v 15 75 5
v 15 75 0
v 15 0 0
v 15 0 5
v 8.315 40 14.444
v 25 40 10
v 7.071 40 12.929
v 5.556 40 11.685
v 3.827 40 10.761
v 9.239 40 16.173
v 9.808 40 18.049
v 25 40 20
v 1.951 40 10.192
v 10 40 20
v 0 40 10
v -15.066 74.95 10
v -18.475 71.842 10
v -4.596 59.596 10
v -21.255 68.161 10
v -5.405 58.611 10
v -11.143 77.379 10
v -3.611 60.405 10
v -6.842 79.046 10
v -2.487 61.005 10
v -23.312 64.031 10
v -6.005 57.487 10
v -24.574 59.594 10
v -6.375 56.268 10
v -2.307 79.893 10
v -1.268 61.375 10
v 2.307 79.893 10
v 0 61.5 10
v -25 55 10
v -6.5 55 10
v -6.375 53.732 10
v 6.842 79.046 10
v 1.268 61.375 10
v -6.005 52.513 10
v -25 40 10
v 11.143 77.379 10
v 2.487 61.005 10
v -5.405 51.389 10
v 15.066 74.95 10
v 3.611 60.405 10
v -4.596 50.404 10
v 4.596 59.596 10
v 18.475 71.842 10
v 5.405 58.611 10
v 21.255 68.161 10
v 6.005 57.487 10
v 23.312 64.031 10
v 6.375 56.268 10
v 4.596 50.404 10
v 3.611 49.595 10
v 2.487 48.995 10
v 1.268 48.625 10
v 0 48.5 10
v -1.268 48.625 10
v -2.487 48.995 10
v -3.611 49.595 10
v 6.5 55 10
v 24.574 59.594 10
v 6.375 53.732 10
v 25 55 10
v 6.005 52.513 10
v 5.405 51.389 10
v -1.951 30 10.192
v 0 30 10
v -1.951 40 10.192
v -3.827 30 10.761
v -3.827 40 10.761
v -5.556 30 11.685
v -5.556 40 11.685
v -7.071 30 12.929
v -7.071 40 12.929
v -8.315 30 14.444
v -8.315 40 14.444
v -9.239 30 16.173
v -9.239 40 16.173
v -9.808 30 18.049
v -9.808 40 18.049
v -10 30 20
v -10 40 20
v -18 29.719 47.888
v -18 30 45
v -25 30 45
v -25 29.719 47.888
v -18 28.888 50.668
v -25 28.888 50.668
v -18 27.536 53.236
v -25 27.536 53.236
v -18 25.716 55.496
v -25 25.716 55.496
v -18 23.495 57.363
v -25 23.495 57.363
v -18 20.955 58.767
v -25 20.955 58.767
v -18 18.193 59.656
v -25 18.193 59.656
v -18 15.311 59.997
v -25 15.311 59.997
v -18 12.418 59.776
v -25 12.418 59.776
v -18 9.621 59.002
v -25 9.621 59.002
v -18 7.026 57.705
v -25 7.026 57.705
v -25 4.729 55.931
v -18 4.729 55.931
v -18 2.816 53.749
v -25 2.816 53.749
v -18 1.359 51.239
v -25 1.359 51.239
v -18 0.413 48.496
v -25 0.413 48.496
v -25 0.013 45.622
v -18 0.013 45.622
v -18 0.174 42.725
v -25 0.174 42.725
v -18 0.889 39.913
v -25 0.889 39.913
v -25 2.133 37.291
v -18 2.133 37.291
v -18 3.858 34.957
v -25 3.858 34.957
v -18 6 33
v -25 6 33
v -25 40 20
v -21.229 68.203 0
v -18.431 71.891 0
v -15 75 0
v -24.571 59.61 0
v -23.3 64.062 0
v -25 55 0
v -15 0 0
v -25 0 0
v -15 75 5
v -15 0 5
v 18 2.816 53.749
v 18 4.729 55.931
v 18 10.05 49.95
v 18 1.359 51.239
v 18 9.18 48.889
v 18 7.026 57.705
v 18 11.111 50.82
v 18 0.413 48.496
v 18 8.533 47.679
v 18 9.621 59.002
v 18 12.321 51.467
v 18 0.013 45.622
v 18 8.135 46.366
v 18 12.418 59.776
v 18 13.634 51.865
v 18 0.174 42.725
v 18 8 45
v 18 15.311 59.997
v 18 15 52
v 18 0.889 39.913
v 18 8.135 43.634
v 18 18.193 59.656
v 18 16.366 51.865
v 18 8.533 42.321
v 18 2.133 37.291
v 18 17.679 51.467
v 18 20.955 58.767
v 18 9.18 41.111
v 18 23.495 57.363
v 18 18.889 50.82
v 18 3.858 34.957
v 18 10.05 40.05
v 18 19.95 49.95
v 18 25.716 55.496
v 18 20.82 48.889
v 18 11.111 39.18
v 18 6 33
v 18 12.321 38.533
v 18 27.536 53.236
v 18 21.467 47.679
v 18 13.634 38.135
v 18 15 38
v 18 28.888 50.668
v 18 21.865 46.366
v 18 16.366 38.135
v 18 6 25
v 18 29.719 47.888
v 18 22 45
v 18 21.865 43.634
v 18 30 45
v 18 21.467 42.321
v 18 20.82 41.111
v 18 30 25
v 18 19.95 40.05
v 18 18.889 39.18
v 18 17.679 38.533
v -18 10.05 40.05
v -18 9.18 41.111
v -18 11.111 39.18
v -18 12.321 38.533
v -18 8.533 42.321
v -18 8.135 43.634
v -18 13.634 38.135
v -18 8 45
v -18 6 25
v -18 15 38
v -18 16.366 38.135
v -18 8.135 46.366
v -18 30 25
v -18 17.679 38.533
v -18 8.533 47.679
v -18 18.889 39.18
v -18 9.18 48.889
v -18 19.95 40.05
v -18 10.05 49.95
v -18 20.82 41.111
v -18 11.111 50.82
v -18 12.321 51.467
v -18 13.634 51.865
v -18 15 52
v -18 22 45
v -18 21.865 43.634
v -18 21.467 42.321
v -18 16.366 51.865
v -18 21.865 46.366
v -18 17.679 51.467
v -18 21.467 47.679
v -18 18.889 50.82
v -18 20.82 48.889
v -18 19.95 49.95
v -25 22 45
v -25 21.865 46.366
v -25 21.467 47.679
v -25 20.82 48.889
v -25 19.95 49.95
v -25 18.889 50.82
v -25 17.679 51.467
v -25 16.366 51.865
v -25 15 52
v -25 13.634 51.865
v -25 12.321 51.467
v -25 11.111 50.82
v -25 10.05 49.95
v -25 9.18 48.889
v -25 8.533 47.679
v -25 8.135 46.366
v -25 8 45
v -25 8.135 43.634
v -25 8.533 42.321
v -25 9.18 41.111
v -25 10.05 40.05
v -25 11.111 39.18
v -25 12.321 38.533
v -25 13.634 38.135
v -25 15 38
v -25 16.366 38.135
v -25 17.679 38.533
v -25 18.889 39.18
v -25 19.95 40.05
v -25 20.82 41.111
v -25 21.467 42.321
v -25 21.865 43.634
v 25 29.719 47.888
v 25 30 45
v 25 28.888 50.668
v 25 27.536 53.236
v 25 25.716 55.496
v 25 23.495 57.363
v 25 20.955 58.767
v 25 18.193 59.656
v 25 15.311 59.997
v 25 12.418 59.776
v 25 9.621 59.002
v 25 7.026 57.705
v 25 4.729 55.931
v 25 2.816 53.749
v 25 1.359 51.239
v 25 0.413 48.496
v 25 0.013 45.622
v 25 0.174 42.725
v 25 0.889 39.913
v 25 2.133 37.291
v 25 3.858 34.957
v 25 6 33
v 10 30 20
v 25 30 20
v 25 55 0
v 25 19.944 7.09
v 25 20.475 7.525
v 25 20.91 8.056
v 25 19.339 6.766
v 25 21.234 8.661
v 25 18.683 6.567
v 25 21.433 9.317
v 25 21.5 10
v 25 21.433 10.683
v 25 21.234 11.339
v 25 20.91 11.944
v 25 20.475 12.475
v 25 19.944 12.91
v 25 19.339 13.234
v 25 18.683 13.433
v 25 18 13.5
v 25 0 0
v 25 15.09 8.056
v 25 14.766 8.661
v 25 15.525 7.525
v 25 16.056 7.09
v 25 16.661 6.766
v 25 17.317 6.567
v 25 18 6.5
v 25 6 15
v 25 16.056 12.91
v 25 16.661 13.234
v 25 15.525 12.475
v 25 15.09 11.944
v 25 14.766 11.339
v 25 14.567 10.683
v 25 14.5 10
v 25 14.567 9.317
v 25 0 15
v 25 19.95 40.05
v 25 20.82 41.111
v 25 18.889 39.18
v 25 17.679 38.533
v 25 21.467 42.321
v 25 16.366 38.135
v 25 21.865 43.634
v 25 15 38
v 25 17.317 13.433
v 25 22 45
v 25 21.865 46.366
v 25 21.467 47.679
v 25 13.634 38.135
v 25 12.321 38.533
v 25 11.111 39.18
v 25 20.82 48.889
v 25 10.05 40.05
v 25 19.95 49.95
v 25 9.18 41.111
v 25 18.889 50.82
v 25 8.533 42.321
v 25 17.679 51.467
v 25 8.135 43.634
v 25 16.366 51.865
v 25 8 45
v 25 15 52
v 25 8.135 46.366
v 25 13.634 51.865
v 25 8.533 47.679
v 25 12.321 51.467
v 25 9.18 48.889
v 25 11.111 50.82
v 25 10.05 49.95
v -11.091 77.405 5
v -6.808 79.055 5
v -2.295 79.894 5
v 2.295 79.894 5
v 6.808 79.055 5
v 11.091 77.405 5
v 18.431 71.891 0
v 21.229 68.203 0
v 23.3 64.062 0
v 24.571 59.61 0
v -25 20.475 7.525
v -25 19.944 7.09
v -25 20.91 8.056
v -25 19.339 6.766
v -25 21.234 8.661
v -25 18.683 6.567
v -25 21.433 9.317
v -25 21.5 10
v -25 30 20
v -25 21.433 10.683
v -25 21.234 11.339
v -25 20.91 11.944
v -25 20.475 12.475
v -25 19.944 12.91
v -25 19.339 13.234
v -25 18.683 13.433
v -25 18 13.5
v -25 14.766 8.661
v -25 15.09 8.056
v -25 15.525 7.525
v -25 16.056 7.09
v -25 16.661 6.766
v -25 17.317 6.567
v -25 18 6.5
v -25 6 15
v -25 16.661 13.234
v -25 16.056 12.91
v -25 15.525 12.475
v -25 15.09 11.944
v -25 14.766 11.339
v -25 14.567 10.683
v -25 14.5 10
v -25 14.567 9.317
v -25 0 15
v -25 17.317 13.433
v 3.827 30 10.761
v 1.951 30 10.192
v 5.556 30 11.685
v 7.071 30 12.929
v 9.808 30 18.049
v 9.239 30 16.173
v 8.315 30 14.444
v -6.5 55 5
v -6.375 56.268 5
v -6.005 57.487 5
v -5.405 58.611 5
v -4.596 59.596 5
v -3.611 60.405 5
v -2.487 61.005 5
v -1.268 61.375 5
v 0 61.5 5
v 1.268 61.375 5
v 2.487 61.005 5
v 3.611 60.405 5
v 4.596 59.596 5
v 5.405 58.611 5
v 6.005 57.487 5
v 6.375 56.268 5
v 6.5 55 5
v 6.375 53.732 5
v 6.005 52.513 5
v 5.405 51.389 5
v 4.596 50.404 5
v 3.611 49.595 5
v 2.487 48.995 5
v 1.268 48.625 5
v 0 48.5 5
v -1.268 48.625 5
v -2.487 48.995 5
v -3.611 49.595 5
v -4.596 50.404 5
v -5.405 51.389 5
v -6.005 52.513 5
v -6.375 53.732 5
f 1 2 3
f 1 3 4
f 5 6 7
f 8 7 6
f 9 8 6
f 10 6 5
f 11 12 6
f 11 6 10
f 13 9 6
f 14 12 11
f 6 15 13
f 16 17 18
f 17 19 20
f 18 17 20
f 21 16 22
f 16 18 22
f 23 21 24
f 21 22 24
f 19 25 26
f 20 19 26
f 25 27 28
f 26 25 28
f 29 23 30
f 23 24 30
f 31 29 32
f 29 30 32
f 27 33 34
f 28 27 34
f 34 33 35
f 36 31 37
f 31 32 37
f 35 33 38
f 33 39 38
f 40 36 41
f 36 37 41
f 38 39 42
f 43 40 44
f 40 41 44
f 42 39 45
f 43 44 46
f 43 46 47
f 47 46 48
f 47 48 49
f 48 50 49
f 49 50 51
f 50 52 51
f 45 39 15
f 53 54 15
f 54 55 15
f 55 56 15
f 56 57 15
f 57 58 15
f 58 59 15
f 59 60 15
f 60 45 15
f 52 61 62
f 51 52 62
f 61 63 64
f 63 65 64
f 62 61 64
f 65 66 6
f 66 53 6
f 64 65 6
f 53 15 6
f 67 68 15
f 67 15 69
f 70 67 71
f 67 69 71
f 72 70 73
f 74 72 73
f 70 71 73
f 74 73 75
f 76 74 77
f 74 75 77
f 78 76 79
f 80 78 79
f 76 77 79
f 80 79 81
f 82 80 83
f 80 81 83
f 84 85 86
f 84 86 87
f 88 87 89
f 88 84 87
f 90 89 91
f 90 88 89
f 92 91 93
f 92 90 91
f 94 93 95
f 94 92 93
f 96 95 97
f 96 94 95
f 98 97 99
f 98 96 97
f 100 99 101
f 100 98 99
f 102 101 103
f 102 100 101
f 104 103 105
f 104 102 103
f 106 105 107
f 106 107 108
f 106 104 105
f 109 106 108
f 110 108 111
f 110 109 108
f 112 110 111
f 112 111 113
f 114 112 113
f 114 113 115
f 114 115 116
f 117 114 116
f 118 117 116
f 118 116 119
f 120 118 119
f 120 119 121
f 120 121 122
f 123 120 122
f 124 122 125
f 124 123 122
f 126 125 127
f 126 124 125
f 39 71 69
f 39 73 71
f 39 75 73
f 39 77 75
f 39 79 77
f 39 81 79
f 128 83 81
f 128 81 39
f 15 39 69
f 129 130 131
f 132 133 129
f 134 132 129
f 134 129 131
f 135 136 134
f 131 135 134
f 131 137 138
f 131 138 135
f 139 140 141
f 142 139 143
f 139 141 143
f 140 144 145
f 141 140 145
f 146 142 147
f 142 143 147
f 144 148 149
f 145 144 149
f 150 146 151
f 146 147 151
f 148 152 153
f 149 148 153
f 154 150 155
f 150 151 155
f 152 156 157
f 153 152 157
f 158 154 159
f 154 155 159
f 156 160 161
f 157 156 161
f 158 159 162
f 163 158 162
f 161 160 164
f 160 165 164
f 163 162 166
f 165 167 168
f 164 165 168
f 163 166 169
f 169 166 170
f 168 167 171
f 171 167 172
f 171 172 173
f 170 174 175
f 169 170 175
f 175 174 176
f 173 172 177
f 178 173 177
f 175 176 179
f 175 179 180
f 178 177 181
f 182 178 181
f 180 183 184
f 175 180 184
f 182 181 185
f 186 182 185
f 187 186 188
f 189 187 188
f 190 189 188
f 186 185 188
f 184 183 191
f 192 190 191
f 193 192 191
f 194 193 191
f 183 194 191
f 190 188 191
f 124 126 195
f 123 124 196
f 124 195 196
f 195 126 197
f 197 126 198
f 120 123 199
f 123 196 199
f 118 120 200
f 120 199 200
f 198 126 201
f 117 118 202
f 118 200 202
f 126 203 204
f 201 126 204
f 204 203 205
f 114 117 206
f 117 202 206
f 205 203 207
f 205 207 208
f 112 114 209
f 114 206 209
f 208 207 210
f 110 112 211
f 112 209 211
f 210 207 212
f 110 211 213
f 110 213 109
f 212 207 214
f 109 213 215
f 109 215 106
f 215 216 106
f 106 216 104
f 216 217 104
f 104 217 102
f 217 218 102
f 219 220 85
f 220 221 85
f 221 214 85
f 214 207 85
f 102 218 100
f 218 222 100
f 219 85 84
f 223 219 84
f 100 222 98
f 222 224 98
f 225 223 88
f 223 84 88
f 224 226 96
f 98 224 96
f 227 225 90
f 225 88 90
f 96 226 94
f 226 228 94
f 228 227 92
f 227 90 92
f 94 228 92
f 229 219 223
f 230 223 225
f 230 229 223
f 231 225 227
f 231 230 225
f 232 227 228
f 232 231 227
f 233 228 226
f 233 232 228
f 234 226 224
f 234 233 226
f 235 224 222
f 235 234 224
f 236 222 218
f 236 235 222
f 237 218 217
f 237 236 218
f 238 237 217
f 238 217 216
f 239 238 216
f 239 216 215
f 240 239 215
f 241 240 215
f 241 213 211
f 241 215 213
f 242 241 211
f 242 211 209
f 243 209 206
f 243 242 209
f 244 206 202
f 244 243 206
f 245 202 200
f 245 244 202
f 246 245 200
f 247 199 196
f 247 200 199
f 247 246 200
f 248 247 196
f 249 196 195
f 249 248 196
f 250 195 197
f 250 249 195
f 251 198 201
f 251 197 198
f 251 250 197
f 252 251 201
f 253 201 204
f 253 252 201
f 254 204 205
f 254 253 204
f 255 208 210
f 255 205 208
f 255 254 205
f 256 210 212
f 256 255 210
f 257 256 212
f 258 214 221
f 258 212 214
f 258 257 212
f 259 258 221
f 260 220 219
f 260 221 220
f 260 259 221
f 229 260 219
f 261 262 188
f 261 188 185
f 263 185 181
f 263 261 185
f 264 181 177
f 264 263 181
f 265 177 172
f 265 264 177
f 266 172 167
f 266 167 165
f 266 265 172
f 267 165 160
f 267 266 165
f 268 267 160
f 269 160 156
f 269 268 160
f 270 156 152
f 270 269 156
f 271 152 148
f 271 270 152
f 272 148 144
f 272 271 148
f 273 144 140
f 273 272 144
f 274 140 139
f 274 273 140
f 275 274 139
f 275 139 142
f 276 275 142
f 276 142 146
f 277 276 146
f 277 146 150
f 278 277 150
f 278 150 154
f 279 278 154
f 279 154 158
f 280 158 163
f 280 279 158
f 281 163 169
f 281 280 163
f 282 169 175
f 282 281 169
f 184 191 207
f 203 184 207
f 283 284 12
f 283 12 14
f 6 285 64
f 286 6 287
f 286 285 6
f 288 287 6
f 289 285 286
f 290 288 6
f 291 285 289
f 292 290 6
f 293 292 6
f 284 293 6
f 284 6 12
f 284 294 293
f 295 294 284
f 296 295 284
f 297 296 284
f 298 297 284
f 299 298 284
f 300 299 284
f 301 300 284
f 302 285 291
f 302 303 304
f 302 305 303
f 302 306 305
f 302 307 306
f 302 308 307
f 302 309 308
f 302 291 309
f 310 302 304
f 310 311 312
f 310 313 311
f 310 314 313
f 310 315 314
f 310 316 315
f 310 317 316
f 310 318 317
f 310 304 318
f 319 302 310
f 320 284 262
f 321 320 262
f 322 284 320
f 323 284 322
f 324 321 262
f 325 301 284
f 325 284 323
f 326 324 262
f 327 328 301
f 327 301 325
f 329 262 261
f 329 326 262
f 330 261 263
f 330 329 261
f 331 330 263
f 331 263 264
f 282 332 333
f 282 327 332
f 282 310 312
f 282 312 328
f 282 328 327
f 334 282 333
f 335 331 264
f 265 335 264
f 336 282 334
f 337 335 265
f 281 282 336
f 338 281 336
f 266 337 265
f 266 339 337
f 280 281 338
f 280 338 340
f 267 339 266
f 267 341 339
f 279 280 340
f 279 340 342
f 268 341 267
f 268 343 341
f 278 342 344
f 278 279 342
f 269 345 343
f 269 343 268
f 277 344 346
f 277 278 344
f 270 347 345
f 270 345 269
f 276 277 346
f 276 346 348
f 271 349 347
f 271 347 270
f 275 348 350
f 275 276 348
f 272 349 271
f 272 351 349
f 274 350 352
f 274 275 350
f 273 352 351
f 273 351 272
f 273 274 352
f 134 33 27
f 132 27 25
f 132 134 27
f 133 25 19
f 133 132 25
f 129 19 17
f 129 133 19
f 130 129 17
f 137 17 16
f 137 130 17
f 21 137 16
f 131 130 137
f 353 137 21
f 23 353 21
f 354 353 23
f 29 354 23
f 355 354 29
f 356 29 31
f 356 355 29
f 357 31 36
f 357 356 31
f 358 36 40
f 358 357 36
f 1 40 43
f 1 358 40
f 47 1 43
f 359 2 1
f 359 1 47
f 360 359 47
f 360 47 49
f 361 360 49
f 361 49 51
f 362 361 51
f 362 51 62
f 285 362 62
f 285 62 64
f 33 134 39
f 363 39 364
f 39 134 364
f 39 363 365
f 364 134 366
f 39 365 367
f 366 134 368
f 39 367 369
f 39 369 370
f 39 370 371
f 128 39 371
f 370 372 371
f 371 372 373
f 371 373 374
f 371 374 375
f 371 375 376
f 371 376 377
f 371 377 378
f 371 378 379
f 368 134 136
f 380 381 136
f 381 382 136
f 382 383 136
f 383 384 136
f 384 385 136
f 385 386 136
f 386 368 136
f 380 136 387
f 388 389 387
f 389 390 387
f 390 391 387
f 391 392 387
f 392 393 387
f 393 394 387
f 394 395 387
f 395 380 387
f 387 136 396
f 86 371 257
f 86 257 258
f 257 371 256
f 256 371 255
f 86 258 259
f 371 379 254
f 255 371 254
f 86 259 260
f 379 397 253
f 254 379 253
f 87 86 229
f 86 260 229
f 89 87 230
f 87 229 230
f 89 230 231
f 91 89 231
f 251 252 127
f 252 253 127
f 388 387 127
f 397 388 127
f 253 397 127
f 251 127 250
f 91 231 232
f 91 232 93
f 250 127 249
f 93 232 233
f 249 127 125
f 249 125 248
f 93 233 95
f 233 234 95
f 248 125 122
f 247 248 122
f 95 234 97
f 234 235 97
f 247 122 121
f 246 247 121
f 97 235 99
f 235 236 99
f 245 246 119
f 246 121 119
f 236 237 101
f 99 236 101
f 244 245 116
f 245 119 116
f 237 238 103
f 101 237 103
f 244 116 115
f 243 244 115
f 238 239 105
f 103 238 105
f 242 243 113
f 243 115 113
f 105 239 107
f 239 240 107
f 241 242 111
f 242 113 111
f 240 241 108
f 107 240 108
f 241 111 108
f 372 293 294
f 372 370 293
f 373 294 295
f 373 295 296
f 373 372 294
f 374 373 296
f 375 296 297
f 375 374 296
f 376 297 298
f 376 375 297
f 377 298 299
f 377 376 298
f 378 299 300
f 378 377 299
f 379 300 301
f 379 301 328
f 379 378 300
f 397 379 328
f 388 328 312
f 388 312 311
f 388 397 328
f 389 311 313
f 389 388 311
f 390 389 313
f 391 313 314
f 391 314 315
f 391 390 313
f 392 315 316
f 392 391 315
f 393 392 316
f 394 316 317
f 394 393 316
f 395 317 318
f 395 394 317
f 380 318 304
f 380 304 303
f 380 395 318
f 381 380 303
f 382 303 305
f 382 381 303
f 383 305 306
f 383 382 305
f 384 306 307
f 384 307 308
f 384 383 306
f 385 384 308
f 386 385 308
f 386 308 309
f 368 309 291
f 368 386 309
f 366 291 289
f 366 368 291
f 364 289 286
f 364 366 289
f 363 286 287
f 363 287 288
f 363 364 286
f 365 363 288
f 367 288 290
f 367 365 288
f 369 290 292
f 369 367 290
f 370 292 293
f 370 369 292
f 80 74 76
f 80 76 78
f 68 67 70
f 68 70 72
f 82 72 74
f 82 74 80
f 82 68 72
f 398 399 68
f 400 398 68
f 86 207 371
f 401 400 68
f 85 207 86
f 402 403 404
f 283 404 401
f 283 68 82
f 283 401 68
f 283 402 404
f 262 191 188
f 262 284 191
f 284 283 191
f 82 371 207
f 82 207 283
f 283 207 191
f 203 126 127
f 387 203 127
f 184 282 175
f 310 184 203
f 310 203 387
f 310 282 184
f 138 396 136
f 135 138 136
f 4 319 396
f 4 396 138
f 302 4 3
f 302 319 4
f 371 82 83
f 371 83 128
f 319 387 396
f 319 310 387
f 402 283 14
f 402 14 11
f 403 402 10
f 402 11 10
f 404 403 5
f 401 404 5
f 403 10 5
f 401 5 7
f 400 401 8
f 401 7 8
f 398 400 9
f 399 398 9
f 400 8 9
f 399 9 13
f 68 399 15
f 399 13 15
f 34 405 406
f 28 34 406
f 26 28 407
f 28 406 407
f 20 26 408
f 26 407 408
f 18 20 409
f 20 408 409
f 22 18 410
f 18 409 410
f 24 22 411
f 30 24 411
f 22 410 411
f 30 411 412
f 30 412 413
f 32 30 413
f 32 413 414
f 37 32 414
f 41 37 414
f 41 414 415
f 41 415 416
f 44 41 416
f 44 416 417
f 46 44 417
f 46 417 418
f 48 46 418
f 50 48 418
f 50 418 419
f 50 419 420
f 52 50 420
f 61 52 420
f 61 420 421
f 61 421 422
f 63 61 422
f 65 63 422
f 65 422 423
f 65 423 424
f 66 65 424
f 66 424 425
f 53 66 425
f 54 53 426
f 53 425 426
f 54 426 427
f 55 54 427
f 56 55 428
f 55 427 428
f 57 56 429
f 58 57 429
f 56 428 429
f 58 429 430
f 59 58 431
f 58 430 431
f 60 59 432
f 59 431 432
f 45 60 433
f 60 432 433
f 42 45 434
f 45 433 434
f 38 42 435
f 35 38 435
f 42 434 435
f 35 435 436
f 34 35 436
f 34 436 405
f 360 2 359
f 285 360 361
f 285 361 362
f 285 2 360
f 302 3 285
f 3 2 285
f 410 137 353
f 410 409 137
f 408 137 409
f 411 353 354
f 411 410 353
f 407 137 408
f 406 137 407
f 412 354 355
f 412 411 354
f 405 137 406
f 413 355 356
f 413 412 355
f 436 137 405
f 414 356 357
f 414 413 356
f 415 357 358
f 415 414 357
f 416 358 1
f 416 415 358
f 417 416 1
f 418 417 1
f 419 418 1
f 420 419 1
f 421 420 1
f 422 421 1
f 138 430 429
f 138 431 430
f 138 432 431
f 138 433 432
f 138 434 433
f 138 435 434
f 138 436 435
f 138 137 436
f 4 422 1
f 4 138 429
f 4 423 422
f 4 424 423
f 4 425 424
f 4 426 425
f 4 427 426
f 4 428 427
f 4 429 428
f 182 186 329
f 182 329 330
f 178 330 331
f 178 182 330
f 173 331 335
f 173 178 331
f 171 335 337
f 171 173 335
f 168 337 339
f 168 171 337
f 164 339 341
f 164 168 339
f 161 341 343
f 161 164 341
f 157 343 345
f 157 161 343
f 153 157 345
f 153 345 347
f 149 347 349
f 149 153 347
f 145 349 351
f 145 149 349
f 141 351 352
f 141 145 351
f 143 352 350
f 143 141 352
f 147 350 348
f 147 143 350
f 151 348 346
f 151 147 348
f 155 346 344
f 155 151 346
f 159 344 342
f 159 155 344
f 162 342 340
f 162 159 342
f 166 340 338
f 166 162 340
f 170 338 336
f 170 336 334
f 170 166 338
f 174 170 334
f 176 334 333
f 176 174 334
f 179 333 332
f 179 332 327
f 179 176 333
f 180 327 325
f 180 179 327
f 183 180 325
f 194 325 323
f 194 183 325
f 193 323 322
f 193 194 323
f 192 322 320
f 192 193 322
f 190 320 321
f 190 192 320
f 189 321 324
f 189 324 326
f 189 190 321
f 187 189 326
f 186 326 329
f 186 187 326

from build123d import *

# Parameters (mm, degrees)
F0_R      = 3.5
F0_R_2    = 7
F1_DEPTH  = 25
F3_DEPTH  = 10
F5_D      = 13
F6_W      = 36
F6_H      = 15
F6_H_2    = 20
F7_DEPTH  = 30.001
F8_W      = 30
F8_H      = 5
F9_DEPTH  = 80.001
F10_W     = 50
F10_H     = 10
F11_DEPTH = 10
F13_DEPTH = 10


with BuildPart() as f1:
    # F0 (on Right) → F1 (new body, symmetric)
    with BuildSketch(Plane.YZ):
        with BuildLine():
            Line((0, 15), (0, 0))
            Line((0, 0), (55, 0))
            Line((55, 0), (55, 10))
            Line((55, 10), (30, 10))
            Line((30, 10), (30, 45))
            ThreePointArc((30, 45), (8.291796, 58.416408), (6, 33))
            Line((6, 33), (6, 15))
            Line((6, 15), (0, 15))
        make_face()
        with Locations((18, 10)):
            Circle(F0_R, mode=Mode.SUBTRACT)
        with Locations((15, 45)):
            Circle(F0_R_2, mode=Mode.SUBTRACT)
    extrude(amount=F1_DEPTH, both=True)

    # F2 (on face) → F3 (join)
    with BuildSketch(Plane(origin=(0, 0, 0), x_dir=(1, 0, 0), z_dir=(0, 0, -1))):
        with BuildLine():
            Line((25, -55), (-25, -55))
            ThreePointArc((-25, -55), (0, -80), (25, -55))
        make_face()
    extrude(amount=-F3_DEPTH)

    # F5 (through all)
    with Locations(Plane.XY.offset(10)):
        with Locations((0, 55)):
            Hole(F5_D / 2)

    # F6 (on face) → F7 (cut, through all)
    with BuildSketch(Plane(origin=(0, 30, 0), x_dir=(-1, 0, 0), z_dir=(0, 1, 0))):
        with Locations((0, 52.5)):
            Rectangle(F6_W, F6_H)
        with Locations((0, 35)):
            Rectangle(F6_W, F6_H_2)
    extrude(amount=-F7_DEPTH, mode=Mode.SUBTRACT)

    # F8 (on face) → F9 (cut, through all)
    with BuildSketch(Plane.XZ):
        with Locations((0, 2.5)):
            Rectangle(F8_W, F8_H)
        with Locations((0, -2.5)):
            Rectangle(F8_W, F8_H)
    extrude(amount=-F9_DEPTH, mode=Mode.SUBTRACT)

    # F10 (on face) → F11 (join)
    with BuildSketch(Plane(origin=(0, 30, 0), x_dir=(-1, 0, 0), z_dir=(0, 1, 0))):
        with Locations((0, 15)):
            Rectangle(F10_W, F10_H)
    extrude(amount=F11_DEPTH)

    # F12 (on face) → F13 (cut)
    with BuildSketch(Plane(origin=(0, 40, 0), x_dir=(-1, 0, 0), z_dir=(0, 1, 0))):
        with BuildLine():
            ThreePointArc((0, 10), (7.071068, 12.928932), (10, 20))
            Line((10, 20), (-10, 20))
            ThreePointArc((-10, 20), (-7.071068, 12.928932), (0, 10))
        make_face()
    extrude(amount=-F13_DEPTH, mode=Mode.SUBTRACT)


solid = f1.part
